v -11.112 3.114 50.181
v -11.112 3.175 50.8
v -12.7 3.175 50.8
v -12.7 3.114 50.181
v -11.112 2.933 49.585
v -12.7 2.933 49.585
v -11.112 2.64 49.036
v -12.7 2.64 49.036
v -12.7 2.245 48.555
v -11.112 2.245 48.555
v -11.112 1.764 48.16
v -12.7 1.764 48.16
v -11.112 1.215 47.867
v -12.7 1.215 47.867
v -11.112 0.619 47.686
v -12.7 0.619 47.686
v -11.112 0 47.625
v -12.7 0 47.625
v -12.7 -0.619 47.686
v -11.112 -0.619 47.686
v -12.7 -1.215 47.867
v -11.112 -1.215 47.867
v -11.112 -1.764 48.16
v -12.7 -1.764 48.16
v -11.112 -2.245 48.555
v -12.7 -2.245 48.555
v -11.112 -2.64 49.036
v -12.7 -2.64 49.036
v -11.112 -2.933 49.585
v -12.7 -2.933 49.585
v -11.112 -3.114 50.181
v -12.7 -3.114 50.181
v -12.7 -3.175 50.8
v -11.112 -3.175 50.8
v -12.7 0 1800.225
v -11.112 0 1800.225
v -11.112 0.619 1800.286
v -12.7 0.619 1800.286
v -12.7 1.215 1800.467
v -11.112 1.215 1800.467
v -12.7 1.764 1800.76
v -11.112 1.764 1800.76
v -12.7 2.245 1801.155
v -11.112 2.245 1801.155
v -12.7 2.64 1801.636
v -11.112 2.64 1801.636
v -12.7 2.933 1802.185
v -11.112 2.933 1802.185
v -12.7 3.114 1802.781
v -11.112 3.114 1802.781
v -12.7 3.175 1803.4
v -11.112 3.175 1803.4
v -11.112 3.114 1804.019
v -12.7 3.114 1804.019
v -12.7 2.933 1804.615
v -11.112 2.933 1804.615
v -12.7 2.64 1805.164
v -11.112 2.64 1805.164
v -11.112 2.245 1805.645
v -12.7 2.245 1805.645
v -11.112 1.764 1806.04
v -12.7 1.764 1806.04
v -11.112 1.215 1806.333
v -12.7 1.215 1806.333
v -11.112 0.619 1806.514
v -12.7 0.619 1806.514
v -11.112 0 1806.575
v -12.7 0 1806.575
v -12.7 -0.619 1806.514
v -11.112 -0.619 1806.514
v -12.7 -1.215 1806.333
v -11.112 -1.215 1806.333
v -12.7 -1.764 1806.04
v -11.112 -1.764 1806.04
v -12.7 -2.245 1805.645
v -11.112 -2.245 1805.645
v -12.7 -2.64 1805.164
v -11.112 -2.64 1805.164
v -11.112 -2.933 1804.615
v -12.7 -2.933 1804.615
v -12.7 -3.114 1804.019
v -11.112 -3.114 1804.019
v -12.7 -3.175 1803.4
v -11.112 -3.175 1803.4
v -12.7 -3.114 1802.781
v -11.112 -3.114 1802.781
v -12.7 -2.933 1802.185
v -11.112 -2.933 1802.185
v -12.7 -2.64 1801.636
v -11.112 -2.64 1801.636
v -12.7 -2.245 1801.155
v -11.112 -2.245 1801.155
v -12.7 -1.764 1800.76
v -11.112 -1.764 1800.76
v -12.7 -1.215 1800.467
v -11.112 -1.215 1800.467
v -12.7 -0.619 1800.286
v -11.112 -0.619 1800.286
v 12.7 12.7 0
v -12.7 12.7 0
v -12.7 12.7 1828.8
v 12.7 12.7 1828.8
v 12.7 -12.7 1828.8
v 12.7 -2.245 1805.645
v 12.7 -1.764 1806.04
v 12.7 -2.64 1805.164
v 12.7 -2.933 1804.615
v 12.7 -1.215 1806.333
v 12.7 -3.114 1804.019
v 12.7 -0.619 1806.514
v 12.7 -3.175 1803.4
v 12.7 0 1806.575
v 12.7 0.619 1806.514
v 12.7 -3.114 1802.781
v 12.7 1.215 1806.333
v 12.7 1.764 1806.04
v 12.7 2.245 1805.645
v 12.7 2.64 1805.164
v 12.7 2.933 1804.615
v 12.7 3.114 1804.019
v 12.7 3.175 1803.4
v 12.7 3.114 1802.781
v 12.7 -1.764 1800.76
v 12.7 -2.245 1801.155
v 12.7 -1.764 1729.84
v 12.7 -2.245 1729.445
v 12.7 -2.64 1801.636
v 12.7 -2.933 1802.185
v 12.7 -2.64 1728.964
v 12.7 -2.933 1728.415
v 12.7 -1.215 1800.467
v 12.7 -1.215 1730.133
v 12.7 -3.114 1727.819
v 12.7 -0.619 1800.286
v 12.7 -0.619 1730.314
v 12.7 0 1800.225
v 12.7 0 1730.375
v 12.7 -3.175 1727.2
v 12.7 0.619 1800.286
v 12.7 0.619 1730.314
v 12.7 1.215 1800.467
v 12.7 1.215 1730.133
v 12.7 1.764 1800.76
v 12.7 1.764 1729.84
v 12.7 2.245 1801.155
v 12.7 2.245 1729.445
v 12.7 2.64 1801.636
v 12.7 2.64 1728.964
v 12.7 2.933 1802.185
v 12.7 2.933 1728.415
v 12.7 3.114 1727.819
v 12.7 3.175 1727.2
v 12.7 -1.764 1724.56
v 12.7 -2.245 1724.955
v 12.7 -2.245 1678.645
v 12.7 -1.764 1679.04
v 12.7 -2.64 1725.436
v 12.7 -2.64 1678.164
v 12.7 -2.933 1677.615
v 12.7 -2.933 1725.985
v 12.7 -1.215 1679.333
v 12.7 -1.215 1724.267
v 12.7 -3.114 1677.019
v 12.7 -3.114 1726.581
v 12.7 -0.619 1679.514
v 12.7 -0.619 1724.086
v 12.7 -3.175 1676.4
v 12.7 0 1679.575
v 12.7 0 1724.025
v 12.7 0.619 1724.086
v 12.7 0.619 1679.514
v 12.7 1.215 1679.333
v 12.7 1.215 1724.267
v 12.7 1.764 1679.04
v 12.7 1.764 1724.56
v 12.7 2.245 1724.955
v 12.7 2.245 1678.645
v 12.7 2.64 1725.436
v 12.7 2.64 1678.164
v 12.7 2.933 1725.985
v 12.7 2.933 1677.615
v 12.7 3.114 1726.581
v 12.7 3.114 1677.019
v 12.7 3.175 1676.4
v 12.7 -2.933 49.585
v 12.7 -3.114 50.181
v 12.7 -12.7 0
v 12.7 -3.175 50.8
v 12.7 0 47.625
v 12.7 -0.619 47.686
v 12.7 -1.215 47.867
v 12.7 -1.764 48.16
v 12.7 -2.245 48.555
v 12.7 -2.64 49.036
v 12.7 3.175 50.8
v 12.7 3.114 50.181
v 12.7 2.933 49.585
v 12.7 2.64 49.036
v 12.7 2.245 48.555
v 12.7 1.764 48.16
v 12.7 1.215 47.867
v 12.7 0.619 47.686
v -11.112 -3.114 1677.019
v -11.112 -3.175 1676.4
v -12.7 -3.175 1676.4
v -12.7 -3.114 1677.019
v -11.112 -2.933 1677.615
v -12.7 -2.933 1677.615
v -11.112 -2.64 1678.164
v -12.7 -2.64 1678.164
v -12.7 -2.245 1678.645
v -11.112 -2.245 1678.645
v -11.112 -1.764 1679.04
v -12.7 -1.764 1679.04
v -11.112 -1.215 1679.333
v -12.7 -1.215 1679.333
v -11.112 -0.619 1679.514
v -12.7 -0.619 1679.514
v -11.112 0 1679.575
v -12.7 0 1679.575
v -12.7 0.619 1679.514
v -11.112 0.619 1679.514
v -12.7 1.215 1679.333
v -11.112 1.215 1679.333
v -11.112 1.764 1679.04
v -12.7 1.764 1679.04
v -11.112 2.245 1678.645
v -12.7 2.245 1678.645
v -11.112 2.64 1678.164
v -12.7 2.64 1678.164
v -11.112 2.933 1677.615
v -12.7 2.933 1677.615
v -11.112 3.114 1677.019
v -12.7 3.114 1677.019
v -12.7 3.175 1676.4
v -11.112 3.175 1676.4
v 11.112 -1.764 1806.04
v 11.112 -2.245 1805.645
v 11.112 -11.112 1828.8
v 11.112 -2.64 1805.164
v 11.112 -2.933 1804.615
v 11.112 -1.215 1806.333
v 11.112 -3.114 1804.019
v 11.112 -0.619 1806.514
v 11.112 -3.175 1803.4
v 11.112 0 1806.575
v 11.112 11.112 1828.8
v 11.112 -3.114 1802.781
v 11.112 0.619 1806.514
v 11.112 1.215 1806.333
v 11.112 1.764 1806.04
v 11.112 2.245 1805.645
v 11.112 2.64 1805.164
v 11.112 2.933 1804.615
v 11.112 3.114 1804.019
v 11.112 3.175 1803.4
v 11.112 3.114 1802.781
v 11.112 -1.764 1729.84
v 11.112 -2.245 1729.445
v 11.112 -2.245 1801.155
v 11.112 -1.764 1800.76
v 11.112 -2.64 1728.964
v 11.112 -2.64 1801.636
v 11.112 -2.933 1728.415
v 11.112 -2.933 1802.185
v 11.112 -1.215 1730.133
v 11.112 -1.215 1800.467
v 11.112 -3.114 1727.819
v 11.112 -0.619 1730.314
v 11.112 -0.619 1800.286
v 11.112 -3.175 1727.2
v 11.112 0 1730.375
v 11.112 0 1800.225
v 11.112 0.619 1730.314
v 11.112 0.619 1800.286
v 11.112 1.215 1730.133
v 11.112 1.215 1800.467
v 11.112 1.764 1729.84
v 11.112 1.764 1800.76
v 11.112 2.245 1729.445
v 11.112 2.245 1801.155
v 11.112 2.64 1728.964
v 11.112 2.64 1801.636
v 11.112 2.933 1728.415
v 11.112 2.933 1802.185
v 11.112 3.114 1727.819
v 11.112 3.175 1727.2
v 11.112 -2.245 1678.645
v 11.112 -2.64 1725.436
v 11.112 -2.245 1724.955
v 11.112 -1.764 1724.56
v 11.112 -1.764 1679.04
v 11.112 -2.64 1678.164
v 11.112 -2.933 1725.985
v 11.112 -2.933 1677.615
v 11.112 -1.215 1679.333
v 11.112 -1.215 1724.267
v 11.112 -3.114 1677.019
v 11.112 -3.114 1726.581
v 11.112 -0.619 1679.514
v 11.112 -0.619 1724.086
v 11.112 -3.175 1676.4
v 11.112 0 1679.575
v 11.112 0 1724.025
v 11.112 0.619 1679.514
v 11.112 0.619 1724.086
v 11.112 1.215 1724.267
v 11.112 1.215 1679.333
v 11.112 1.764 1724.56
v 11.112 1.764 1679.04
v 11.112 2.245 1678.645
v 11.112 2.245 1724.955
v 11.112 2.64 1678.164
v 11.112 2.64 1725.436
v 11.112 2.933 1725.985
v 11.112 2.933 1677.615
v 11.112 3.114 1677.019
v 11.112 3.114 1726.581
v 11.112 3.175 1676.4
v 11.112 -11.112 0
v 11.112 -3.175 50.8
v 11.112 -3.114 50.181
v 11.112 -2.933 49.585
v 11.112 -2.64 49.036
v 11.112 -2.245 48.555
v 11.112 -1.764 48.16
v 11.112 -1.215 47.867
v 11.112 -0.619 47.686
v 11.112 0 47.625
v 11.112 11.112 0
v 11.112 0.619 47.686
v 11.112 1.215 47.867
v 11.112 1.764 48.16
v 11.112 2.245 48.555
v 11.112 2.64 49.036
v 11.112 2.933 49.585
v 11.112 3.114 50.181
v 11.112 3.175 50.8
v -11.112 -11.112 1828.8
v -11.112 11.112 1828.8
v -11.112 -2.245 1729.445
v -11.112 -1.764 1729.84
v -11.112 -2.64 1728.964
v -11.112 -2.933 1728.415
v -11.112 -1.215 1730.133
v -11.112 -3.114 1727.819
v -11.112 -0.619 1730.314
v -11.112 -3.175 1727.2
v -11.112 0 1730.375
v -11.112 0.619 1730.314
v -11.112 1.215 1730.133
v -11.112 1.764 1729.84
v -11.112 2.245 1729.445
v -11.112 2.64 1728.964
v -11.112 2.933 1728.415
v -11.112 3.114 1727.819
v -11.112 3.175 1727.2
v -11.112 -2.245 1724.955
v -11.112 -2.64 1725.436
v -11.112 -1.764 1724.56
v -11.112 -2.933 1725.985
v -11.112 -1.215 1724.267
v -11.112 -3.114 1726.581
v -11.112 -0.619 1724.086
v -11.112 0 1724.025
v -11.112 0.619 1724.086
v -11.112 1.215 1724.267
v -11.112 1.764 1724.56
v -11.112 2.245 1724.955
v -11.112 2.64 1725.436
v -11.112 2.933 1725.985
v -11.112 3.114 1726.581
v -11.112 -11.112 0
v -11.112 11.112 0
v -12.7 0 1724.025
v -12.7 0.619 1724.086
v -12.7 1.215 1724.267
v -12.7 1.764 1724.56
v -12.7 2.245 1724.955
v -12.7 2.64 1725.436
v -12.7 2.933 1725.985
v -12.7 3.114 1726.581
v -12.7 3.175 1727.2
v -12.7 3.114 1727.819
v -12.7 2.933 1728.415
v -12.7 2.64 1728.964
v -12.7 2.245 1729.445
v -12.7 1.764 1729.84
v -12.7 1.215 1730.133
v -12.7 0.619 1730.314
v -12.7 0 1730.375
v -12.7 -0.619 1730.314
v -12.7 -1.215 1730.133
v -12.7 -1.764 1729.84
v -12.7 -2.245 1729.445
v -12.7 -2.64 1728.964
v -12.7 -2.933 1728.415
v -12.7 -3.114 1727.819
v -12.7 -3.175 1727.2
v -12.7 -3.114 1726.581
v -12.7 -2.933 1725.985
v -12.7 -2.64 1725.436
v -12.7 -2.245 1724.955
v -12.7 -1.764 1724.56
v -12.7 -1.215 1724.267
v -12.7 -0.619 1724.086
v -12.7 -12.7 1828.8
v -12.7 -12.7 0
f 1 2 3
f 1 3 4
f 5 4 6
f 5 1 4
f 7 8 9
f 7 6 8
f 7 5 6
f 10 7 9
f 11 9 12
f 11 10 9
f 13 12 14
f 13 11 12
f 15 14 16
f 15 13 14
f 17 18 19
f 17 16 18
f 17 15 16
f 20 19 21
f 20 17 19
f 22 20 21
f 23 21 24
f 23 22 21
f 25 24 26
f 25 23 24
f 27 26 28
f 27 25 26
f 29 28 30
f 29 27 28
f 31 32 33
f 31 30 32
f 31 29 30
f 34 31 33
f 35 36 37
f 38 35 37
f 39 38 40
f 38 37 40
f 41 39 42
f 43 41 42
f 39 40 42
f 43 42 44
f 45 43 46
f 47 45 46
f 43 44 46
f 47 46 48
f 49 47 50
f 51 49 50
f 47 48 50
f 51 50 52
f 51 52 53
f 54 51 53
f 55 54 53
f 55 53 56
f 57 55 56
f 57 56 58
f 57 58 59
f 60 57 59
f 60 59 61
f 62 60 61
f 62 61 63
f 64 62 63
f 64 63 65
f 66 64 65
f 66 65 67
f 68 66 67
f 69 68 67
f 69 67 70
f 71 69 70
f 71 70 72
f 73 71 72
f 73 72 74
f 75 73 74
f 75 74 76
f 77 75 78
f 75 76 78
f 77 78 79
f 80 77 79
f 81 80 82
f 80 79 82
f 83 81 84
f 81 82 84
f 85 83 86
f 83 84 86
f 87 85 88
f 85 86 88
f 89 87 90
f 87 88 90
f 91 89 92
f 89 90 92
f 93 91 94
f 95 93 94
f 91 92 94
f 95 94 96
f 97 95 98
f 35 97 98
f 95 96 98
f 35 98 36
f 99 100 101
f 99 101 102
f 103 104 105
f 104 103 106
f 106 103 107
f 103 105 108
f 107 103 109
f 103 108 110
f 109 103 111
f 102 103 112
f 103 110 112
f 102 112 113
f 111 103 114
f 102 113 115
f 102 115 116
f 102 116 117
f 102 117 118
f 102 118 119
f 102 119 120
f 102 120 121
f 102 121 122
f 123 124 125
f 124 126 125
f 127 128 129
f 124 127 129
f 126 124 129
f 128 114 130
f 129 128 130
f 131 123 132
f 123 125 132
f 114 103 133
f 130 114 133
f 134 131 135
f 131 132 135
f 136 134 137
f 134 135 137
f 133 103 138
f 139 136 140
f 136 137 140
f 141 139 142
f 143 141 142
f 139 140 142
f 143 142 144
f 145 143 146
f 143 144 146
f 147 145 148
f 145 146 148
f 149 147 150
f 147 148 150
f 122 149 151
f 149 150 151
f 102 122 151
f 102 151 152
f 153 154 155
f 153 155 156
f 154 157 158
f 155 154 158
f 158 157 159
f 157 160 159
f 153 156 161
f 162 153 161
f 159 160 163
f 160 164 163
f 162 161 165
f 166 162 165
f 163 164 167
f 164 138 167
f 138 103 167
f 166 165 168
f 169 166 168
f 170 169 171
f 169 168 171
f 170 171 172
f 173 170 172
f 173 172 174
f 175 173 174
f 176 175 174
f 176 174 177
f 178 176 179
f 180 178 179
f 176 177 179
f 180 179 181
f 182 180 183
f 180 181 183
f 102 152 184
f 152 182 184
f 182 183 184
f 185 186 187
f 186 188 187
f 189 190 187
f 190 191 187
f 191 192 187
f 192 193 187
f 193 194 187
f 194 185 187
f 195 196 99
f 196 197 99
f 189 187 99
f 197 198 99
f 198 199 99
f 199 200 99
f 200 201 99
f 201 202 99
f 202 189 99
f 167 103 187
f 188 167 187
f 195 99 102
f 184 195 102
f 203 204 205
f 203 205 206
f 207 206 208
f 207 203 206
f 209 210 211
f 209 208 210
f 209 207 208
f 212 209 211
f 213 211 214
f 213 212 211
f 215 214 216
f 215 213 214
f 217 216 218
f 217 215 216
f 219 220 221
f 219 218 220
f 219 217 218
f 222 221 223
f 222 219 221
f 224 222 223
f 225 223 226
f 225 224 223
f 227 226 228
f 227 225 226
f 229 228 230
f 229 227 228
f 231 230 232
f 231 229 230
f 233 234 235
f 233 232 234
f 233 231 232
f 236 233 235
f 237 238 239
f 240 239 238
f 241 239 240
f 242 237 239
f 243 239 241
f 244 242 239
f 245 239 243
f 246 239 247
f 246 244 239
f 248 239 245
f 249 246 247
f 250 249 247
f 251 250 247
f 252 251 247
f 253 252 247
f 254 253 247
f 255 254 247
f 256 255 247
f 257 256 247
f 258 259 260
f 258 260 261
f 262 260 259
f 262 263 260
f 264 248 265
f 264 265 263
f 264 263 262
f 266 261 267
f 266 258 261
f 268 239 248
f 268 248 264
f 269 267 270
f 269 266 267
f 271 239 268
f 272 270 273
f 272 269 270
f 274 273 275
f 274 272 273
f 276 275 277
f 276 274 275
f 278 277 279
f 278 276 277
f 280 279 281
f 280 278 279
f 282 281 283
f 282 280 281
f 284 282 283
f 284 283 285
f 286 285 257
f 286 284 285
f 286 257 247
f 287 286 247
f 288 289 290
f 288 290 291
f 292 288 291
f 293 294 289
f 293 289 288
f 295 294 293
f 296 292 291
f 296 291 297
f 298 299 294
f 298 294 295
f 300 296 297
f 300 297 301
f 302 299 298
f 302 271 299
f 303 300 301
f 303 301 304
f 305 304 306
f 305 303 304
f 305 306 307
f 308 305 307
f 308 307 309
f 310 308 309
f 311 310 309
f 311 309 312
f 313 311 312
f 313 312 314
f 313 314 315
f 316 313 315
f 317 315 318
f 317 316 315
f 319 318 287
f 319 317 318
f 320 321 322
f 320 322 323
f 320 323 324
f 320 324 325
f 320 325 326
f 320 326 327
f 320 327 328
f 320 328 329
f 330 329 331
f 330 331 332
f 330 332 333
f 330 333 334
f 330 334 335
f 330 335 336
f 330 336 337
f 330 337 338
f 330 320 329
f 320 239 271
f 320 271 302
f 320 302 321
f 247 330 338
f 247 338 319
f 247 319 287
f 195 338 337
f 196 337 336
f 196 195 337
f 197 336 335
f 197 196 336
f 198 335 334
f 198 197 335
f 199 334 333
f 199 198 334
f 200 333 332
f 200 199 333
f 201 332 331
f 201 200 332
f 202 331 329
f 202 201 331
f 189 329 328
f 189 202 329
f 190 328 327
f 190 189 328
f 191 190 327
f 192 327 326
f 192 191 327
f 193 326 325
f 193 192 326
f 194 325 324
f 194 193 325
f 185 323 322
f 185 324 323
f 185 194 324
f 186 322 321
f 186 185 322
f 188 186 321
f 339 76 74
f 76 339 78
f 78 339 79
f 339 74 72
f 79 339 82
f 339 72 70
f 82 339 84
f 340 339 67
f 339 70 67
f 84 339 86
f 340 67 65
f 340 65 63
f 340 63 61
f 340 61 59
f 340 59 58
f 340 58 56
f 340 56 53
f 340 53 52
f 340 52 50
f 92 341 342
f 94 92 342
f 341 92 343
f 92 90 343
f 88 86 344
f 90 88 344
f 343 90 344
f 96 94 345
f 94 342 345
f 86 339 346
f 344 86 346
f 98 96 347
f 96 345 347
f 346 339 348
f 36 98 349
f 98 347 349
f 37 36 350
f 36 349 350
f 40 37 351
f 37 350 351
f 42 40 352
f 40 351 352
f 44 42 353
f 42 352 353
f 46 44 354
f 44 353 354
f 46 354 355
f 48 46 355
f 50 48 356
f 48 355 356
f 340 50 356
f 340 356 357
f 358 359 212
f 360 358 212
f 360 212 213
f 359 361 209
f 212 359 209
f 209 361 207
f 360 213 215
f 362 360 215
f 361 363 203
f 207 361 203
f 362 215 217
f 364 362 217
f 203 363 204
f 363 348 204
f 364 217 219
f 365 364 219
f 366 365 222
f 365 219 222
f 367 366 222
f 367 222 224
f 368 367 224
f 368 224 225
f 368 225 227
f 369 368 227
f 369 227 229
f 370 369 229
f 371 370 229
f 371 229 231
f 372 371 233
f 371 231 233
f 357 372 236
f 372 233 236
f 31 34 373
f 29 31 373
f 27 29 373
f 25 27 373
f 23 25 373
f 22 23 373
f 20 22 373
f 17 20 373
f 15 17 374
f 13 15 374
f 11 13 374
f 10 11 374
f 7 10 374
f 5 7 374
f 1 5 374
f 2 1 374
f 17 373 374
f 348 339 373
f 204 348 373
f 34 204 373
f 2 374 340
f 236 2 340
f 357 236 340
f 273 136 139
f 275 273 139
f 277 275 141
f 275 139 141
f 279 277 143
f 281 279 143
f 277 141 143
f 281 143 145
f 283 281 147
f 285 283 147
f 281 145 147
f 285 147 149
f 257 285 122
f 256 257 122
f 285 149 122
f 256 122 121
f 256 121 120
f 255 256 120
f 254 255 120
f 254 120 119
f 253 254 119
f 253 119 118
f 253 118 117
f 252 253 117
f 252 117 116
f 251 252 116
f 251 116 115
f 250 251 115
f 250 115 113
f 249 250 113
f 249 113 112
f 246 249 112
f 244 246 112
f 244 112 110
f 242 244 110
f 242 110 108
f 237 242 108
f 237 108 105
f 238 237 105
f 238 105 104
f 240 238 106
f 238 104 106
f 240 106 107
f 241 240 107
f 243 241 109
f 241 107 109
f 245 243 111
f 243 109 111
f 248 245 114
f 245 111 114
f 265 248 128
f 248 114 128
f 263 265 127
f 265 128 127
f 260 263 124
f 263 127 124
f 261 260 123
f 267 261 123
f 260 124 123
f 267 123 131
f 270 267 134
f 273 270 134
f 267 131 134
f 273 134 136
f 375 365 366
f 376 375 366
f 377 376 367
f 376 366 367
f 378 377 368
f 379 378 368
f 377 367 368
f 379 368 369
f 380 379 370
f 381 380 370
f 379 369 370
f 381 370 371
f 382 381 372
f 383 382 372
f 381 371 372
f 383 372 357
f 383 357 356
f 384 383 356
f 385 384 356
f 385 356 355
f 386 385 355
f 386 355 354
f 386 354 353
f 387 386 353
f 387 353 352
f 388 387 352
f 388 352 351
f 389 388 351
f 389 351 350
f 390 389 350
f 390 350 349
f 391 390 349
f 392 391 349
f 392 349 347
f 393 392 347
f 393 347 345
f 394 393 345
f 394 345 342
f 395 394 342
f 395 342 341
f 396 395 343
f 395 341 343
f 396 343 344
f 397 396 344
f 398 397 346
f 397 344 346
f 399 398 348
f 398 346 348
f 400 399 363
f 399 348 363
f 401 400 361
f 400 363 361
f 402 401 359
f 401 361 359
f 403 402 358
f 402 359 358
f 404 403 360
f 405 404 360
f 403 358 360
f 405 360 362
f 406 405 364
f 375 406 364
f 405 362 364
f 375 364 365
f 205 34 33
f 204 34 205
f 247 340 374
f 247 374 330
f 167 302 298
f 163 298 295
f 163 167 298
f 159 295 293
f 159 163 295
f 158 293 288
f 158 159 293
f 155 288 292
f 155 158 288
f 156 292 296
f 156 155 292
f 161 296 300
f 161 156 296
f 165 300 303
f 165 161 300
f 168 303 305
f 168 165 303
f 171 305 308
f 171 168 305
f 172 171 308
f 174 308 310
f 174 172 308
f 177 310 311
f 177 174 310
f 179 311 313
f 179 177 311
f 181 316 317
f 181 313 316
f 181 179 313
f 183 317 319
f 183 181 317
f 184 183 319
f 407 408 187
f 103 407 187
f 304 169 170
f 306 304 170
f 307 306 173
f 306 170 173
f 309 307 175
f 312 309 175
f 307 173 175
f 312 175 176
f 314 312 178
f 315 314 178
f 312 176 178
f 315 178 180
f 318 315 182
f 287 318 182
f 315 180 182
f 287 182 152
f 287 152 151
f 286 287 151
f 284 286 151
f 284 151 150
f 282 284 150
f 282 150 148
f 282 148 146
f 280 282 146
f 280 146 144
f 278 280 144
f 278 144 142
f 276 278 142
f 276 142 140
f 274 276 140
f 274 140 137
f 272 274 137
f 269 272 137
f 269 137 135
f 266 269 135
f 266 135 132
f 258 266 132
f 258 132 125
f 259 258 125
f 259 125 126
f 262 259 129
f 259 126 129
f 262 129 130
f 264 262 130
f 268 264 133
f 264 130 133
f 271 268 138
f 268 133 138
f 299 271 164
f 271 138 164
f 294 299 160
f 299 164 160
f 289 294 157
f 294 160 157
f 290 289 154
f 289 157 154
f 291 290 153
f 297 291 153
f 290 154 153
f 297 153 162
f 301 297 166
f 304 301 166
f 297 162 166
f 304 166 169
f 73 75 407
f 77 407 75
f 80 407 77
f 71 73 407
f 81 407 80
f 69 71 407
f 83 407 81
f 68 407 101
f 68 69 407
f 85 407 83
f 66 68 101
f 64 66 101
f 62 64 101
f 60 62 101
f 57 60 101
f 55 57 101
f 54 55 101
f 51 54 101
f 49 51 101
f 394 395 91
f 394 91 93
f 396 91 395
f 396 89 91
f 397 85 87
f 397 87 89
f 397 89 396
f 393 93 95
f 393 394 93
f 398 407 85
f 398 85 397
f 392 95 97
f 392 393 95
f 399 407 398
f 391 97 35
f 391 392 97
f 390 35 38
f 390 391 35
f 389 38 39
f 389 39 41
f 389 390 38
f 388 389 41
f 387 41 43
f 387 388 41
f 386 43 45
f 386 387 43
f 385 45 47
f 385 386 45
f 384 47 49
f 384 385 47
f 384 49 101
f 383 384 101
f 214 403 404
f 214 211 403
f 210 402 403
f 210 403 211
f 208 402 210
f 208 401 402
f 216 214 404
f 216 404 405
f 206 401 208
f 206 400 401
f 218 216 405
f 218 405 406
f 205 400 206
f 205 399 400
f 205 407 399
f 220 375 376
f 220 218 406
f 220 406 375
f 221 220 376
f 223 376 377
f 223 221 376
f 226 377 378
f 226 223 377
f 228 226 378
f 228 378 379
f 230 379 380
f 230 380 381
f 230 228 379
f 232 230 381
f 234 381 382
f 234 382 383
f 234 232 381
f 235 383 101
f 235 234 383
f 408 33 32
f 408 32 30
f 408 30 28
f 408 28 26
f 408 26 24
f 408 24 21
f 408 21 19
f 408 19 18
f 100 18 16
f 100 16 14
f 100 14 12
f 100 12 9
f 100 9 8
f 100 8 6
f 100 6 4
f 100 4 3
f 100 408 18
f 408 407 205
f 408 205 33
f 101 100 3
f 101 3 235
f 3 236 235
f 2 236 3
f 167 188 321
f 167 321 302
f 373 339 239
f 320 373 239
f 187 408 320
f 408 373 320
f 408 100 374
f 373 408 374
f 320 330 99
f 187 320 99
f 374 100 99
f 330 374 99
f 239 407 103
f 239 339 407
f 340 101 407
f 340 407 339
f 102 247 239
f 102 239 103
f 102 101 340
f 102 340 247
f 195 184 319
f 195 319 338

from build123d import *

# Parameters (mm, degrees)
SKETCH1_W           = 25.4
SKETCH1_H           = 25.4
SKETCH1_W_2         = 22.225
SKETCH1_H_2         = 22.225
BOSS_EXTRUDE1_DEPTH = 1828.8
SKETCH2_R           = 3.175
CUT_EXTRUDE1_DEPTH  = 26.4
CUT_EXTRUDE2_DEPTH  = 26.4


with BuildPart() as part:
    # Sketch1 → Boss-Extrude1 (new body)
    with BuildSketch(Plane.XY):
        Rectangle(SKETCH1_W, SKETCH1_H)
        Rectangle(SKETCH1_W_2, SKETCH1_H_2, mode=Mode.SUBTRACT)
    extrude(amount=BOSS_EXTRUDE1_DEPTH)

    # Sketch2 → Cut-Extrude1 (cut, through all)
    with BuildSketch(Plane(origin=(12.7, 0, 0), x_dir=(0, 0, -1), z_dir=(1, 0, 0))):
        with Locations((-1727.2, 0)):
            Circle(SKETCH2_R)
        with Locations((-1803.4, 0)):
            Circle(SKETCH2_R)
    extrude(amount=-CUT_EXTRUDE1_DEPTH, mode=Mode.SUBTRACT)

    # Sketch3 → Cut-Extrude2 (cut, through all)
    with BuildSketch(Plane(origin=(12.7, 0, 0), x_dir=(0, 0, -1), z_dir=(1, 0, 0))):
        with BuildLine():
            Line((-1676.4, 3.175), (-50.8, 3.175))
            ThreePointArc((-50.8, 3.175), (-47.625, 0), (-50.8, -3.175))
            Line((-50.8, -3.175), (-1676.4, -3.175))
            ThreePointArc((-1676.4, -3.175), (-1679.575, 0), (-1676.4, 3.175))
        make_face()
    extrude(amount=-CUT_EXTRUDE2_DEPTH, mode=Mode.SUBTRACT)


solid = part.part
